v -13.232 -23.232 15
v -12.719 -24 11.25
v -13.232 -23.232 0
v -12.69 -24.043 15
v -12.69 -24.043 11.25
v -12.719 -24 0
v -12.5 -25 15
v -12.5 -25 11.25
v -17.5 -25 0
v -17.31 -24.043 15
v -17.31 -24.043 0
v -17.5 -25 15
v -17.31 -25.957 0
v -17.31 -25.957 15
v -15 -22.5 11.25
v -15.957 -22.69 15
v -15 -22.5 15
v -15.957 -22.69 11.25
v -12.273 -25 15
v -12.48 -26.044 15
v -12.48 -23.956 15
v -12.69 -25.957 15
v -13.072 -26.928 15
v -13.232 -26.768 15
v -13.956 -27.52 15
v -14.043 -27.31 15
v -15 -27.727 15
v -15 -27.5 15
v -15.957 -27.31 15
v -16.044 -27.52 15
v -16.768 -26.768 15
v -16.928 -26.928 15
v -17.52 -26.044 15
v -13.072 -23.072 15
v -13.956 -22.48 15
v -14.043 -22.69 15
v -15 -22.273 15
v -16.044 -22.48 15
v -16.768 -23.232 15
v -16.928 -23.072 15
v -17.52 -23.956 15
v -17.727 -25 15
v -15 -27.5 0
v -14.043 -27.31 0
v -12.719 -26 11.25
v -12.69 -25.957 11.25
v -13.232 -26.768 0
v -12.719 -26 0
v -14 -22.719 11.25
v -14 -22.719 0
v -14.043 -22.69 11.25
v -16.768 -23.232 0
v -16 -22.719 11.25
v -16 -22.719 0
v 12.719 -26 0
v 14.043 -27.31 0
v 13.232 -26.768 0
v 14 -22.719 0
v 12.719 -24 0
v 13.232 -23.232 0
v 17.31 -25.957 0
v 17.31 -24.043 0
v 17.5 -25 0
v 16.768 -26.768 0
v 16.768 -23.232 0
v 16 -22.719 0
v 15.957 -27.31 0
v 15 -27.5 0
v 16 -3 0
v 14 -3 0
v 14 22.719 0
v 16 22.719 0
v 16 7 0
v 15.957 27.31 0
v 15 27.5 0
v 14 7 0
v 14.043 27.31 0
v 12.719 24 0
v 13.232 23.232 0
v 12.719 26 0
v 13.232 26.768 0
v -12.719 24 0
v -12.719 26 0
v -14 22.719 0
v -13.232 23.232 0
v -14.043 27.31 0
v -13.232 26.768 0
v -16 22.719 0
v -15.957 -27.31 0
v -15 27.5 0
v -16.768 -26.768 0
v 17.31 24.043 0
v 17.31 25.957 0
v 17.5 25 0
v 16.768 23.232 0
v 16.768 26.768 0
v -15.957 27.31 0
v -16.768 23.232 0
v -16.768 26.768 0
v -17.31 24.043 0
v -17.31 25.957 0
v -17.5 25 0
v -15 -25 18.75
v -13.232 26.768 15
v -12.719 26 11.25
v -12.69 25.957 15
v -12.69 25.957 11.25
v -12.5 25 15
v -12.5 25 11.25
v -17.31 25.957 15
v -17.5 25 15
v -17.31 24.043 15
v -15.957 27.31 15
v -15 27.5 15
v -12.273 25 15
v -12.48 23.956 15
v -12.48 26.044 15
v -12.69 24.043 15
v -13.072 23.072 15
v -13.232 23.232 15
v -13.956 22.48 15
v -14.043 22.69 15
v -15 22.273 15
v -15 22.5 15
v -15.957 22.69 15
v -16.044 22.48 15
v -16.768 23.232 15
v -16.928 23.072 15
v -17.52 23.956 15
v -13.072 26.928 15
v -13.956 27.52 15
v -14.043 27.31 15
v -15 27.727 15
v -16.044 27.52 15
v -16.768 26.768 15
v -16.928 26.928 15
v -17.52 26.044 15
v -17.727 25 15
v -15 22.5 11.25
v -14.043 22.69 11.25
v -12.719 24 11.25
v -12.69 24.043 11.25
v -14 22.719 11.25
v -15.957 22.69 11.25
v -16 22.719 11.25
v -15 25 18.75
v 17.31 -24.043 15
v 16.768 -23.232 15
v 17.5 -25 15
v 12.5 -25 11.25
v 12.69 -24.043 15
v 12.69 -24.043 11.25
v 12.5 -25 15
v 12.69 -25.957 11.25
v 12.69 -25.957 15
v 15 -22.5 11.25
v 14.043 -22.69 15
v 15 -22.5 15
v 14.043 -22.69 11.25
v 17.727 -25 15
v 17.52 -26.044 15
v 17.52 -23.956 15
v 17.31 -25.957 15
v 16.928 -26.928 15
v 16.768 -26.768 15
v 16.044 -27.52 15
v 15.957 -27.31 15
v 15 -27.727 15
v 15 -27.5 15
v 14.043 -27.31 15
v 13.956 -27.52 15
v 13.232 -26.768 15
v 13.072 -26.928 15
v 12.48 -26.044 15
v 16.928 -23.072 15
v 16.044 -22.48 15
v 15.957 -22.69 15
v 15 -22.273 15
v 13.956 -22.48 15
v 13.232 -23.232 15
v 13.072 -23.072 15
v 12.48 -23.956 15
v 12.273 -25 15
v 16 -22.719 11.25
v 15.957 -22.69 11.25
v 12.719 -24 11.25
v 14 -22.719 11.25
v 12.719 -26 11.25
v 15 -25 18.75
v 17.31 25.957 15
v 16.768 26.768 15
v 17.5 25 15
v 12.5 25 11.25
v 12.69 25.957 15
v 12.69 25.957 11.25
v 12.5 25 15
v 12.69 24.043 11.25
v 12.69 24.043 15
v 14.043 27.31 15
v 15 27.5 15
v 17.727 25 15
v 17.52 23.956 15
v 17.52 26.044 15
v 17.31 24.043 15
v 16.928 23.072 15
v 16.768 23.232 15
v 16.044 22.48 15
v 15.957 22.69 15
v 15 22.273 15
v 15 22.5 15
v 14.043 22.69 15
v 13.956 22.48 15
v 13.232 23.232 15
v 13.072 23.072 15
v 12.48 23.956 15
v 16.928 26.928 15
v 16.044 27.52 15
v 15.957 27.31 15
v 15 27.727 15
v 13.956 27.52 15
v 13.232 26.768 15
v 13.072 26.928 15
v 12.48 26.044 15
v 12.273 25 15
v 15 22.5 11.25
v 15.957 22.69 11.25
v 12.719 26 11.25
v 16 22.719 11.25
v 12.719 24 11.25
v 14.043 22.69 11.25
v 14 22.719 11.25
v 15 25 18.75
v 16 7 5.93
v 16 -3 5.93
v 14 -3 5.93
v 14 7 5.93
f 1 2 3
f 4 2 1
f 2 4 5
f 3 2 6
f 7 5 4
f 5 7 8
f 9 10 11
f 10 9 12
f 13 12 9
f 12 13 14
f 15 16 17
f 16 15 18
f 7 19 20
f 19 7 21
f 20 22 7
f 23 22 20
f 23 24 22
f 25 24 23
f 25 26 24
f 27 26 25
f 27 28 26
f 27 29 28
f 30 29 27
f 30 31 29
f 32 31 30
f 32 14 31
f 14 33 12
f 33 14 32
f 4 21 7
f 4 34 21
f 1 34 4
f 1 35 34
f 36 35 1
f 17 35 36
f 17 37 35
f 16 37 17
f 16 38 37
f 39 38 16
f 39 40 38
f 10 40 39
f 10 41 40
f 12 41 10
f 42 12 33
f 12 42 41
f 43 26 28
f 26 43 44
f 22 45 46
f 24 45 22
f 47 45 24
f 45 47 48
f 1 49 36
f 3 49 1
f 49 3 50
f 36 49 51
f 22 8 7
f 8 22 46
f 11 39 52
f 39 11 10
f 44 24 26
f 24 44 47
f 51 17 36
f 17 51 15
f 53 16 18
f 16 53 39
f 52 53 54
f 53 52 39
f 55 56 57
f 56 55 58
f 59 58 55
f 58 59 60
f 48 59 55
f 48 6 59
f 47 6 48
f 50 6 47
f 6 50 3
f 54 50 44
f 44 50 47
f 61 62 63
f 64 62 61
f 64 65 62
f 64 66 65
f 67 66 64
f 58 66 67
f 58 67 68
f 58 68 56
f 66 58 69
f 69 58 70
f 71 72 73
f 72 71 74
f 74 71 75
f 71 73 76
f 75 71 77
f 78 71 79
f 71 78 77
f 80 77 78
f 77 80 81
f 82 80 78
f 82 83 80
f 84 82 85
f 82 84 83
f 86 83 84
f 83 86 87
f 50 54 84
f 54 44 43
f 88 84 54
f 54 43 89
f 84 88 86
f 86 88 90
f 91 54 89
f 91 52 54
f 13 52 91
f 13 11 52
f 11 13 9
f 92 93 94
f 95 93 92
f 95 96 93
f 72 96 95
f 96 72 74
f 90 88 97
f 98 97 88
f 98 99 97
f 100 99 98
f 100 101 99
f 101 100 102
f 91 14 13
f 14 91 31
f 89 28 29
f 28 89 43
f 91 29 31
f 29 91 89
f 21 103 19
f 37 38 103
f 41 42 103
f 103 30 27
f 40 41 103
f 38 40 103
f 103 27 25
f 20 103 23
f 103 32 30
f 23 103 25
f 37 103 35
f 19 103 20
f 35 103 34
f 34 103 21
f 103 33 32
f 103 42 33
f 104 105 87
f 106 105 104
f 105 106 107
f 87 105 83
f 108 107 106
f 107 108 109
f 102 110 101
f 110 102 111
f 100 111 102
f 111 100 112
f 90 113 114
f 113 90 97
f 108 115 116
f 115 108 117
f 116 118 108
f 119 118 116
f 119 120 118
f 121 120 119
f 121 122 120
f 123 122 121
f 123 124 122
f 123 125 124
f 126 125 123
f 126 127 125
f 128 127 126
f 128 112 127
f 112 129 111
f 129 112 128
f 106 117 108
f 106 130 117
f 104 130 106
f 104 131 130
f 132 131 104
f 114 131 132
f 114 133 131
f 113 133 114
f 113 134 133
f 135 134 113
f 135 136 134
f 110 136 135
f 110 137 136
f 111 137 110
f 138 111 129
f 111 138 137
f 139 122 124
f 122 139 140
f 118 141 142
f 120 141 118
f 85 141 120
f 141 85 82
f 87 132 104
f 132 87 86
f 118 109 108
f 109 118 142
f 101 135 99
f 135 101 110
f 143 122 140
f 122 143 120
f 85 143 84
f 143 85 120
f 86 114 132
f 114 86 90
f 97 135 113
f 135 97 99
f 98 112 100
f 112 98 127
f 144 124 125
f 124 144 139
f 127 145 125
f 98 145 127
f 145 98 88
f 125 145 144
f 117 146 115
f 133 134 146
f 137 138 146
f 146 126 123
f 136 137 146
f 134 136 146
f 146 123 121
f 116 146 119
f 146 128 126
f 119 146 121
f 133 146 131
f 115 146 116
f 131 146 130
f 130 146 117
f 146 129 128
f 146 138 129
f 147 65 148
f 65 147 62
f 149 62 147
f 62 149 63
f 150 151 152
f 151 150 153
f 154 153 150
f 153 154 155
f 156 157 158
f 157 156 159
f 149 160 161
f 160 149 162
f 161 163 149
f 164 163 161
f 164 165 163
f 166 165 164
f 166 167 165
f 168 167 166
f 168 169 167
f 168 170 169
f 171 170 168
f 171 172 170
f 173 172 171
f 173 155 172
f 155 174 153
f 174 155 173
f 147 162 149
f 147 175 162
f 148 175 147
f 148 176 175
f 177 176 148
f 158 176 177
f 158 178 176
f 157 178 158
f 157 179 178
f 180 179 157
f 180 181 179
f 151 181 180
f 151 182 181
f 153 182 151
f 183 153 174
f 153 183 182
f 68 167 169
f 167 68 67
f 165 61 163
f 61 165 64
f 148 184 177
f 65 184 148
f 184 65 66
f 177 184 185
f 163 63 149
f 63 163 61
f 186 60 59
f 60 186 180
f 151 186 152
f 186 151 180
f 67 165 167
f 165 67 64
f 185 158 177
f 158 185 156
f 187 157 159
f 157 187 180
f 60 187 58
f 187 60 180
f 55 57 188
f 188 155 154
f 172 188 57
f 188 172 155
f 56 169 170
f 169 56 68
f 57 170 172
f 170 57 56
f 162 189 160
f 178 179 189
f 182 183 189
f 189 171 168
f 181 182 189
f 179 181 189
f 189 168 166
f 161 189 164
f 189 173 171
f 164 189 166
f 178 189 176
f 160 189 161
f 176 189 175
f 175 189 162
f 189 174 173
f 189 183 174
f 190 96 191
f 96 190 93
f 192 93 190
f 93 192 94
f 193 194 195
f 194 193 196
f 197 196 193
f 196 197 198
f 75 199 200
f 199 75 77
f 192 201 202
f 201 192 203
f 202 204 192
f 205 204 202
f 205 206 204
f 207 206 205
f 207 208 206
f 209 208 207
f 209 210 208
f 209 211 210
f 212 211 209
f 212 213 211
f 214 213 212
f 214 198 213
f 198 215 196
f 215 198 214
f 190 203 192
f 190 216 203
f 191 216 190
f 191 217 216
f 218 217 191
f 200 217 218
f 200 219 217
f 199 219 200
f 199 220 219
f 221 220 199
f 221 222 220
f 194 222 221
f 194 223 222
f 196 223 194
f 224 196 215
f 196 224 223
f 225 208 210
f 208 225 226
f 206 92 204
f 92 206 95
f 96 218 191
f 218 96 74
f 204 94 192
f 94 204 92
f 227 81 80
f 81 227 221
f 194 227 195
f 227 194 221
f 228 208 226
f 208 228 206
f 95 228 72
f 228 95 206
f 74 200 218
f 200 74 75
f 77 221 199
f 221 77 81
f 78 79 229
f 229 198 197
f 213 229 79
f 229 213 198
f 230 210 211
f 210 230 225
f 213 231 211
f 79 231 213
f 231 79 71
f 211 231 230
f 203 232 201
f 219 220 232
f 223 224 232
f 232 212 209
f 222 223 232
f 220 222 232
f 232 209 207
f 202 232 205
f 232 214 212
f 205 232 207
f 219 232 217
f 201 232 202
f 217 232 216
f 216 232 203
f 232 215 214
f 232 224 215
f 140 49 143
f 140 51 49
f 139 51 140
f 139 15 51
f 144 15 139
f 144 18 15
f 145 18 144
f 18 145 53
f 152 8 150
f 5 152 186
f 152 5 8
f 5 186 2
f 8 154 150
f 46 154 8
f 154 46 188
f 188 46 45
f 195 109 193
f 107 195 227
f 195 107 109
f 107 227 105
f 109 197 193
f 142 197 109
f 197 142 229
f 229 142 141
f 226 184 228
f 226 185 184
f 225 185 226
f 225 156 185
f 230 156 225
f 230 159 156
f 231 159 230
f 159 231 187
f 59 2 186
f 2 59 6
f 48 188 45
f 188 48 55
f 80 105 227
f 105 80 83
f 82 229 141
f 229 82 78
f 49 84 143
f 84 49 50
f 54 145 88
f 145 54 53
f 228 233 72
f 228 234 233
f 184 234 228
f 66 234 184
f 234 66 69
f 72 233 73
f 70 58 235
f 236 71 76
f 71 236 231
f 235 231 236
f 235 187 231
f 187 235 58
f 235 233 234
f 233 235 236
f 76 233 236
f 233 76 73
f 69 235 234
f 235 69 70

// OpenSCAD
//////////////////////////////////
$fn=16;
s = [30, 50, 15];
walls=2;

castle();
module castle() 
{
    difference(){
        union(){
            //four corner towers
            for(x=[-1:2:1], y=[-1:2:1])
            translate([s[0]/2*x, s[1]/2*y, 0])
            tower(height=s[2]);
    
            //sidewalls
            for(y=[-1:2:1])
            translate([0,y*s[1]/2, 0])
            wall([s[0], walls, s[2]*3/4], false);
            //front and back walls
            for(x=[-1:2:1])
            translate([x*s[0]/2, 0, 0])
            wall([walls, s[1], s[2]*3/4]);
        }
        maindoor();
    }
}
module tower(height = 15)
{
    translate([0, 0, height/2])
    union()
    {
        cylinder(d=height/3, h=height, center=true);
        translate([0,0, height*5/8])
        cylinder(d1=height/2.75, d2=0, h=height/4, center=true);
    }
}
module wall(dims=[30, 3, 10])
{
    translate([0, 0, dims[2]/2])
    cube(dims, center=true);
    
} 
module maindoor()
{
      translate([14,-3,-.07]) cube([10,10,6]);
} 
